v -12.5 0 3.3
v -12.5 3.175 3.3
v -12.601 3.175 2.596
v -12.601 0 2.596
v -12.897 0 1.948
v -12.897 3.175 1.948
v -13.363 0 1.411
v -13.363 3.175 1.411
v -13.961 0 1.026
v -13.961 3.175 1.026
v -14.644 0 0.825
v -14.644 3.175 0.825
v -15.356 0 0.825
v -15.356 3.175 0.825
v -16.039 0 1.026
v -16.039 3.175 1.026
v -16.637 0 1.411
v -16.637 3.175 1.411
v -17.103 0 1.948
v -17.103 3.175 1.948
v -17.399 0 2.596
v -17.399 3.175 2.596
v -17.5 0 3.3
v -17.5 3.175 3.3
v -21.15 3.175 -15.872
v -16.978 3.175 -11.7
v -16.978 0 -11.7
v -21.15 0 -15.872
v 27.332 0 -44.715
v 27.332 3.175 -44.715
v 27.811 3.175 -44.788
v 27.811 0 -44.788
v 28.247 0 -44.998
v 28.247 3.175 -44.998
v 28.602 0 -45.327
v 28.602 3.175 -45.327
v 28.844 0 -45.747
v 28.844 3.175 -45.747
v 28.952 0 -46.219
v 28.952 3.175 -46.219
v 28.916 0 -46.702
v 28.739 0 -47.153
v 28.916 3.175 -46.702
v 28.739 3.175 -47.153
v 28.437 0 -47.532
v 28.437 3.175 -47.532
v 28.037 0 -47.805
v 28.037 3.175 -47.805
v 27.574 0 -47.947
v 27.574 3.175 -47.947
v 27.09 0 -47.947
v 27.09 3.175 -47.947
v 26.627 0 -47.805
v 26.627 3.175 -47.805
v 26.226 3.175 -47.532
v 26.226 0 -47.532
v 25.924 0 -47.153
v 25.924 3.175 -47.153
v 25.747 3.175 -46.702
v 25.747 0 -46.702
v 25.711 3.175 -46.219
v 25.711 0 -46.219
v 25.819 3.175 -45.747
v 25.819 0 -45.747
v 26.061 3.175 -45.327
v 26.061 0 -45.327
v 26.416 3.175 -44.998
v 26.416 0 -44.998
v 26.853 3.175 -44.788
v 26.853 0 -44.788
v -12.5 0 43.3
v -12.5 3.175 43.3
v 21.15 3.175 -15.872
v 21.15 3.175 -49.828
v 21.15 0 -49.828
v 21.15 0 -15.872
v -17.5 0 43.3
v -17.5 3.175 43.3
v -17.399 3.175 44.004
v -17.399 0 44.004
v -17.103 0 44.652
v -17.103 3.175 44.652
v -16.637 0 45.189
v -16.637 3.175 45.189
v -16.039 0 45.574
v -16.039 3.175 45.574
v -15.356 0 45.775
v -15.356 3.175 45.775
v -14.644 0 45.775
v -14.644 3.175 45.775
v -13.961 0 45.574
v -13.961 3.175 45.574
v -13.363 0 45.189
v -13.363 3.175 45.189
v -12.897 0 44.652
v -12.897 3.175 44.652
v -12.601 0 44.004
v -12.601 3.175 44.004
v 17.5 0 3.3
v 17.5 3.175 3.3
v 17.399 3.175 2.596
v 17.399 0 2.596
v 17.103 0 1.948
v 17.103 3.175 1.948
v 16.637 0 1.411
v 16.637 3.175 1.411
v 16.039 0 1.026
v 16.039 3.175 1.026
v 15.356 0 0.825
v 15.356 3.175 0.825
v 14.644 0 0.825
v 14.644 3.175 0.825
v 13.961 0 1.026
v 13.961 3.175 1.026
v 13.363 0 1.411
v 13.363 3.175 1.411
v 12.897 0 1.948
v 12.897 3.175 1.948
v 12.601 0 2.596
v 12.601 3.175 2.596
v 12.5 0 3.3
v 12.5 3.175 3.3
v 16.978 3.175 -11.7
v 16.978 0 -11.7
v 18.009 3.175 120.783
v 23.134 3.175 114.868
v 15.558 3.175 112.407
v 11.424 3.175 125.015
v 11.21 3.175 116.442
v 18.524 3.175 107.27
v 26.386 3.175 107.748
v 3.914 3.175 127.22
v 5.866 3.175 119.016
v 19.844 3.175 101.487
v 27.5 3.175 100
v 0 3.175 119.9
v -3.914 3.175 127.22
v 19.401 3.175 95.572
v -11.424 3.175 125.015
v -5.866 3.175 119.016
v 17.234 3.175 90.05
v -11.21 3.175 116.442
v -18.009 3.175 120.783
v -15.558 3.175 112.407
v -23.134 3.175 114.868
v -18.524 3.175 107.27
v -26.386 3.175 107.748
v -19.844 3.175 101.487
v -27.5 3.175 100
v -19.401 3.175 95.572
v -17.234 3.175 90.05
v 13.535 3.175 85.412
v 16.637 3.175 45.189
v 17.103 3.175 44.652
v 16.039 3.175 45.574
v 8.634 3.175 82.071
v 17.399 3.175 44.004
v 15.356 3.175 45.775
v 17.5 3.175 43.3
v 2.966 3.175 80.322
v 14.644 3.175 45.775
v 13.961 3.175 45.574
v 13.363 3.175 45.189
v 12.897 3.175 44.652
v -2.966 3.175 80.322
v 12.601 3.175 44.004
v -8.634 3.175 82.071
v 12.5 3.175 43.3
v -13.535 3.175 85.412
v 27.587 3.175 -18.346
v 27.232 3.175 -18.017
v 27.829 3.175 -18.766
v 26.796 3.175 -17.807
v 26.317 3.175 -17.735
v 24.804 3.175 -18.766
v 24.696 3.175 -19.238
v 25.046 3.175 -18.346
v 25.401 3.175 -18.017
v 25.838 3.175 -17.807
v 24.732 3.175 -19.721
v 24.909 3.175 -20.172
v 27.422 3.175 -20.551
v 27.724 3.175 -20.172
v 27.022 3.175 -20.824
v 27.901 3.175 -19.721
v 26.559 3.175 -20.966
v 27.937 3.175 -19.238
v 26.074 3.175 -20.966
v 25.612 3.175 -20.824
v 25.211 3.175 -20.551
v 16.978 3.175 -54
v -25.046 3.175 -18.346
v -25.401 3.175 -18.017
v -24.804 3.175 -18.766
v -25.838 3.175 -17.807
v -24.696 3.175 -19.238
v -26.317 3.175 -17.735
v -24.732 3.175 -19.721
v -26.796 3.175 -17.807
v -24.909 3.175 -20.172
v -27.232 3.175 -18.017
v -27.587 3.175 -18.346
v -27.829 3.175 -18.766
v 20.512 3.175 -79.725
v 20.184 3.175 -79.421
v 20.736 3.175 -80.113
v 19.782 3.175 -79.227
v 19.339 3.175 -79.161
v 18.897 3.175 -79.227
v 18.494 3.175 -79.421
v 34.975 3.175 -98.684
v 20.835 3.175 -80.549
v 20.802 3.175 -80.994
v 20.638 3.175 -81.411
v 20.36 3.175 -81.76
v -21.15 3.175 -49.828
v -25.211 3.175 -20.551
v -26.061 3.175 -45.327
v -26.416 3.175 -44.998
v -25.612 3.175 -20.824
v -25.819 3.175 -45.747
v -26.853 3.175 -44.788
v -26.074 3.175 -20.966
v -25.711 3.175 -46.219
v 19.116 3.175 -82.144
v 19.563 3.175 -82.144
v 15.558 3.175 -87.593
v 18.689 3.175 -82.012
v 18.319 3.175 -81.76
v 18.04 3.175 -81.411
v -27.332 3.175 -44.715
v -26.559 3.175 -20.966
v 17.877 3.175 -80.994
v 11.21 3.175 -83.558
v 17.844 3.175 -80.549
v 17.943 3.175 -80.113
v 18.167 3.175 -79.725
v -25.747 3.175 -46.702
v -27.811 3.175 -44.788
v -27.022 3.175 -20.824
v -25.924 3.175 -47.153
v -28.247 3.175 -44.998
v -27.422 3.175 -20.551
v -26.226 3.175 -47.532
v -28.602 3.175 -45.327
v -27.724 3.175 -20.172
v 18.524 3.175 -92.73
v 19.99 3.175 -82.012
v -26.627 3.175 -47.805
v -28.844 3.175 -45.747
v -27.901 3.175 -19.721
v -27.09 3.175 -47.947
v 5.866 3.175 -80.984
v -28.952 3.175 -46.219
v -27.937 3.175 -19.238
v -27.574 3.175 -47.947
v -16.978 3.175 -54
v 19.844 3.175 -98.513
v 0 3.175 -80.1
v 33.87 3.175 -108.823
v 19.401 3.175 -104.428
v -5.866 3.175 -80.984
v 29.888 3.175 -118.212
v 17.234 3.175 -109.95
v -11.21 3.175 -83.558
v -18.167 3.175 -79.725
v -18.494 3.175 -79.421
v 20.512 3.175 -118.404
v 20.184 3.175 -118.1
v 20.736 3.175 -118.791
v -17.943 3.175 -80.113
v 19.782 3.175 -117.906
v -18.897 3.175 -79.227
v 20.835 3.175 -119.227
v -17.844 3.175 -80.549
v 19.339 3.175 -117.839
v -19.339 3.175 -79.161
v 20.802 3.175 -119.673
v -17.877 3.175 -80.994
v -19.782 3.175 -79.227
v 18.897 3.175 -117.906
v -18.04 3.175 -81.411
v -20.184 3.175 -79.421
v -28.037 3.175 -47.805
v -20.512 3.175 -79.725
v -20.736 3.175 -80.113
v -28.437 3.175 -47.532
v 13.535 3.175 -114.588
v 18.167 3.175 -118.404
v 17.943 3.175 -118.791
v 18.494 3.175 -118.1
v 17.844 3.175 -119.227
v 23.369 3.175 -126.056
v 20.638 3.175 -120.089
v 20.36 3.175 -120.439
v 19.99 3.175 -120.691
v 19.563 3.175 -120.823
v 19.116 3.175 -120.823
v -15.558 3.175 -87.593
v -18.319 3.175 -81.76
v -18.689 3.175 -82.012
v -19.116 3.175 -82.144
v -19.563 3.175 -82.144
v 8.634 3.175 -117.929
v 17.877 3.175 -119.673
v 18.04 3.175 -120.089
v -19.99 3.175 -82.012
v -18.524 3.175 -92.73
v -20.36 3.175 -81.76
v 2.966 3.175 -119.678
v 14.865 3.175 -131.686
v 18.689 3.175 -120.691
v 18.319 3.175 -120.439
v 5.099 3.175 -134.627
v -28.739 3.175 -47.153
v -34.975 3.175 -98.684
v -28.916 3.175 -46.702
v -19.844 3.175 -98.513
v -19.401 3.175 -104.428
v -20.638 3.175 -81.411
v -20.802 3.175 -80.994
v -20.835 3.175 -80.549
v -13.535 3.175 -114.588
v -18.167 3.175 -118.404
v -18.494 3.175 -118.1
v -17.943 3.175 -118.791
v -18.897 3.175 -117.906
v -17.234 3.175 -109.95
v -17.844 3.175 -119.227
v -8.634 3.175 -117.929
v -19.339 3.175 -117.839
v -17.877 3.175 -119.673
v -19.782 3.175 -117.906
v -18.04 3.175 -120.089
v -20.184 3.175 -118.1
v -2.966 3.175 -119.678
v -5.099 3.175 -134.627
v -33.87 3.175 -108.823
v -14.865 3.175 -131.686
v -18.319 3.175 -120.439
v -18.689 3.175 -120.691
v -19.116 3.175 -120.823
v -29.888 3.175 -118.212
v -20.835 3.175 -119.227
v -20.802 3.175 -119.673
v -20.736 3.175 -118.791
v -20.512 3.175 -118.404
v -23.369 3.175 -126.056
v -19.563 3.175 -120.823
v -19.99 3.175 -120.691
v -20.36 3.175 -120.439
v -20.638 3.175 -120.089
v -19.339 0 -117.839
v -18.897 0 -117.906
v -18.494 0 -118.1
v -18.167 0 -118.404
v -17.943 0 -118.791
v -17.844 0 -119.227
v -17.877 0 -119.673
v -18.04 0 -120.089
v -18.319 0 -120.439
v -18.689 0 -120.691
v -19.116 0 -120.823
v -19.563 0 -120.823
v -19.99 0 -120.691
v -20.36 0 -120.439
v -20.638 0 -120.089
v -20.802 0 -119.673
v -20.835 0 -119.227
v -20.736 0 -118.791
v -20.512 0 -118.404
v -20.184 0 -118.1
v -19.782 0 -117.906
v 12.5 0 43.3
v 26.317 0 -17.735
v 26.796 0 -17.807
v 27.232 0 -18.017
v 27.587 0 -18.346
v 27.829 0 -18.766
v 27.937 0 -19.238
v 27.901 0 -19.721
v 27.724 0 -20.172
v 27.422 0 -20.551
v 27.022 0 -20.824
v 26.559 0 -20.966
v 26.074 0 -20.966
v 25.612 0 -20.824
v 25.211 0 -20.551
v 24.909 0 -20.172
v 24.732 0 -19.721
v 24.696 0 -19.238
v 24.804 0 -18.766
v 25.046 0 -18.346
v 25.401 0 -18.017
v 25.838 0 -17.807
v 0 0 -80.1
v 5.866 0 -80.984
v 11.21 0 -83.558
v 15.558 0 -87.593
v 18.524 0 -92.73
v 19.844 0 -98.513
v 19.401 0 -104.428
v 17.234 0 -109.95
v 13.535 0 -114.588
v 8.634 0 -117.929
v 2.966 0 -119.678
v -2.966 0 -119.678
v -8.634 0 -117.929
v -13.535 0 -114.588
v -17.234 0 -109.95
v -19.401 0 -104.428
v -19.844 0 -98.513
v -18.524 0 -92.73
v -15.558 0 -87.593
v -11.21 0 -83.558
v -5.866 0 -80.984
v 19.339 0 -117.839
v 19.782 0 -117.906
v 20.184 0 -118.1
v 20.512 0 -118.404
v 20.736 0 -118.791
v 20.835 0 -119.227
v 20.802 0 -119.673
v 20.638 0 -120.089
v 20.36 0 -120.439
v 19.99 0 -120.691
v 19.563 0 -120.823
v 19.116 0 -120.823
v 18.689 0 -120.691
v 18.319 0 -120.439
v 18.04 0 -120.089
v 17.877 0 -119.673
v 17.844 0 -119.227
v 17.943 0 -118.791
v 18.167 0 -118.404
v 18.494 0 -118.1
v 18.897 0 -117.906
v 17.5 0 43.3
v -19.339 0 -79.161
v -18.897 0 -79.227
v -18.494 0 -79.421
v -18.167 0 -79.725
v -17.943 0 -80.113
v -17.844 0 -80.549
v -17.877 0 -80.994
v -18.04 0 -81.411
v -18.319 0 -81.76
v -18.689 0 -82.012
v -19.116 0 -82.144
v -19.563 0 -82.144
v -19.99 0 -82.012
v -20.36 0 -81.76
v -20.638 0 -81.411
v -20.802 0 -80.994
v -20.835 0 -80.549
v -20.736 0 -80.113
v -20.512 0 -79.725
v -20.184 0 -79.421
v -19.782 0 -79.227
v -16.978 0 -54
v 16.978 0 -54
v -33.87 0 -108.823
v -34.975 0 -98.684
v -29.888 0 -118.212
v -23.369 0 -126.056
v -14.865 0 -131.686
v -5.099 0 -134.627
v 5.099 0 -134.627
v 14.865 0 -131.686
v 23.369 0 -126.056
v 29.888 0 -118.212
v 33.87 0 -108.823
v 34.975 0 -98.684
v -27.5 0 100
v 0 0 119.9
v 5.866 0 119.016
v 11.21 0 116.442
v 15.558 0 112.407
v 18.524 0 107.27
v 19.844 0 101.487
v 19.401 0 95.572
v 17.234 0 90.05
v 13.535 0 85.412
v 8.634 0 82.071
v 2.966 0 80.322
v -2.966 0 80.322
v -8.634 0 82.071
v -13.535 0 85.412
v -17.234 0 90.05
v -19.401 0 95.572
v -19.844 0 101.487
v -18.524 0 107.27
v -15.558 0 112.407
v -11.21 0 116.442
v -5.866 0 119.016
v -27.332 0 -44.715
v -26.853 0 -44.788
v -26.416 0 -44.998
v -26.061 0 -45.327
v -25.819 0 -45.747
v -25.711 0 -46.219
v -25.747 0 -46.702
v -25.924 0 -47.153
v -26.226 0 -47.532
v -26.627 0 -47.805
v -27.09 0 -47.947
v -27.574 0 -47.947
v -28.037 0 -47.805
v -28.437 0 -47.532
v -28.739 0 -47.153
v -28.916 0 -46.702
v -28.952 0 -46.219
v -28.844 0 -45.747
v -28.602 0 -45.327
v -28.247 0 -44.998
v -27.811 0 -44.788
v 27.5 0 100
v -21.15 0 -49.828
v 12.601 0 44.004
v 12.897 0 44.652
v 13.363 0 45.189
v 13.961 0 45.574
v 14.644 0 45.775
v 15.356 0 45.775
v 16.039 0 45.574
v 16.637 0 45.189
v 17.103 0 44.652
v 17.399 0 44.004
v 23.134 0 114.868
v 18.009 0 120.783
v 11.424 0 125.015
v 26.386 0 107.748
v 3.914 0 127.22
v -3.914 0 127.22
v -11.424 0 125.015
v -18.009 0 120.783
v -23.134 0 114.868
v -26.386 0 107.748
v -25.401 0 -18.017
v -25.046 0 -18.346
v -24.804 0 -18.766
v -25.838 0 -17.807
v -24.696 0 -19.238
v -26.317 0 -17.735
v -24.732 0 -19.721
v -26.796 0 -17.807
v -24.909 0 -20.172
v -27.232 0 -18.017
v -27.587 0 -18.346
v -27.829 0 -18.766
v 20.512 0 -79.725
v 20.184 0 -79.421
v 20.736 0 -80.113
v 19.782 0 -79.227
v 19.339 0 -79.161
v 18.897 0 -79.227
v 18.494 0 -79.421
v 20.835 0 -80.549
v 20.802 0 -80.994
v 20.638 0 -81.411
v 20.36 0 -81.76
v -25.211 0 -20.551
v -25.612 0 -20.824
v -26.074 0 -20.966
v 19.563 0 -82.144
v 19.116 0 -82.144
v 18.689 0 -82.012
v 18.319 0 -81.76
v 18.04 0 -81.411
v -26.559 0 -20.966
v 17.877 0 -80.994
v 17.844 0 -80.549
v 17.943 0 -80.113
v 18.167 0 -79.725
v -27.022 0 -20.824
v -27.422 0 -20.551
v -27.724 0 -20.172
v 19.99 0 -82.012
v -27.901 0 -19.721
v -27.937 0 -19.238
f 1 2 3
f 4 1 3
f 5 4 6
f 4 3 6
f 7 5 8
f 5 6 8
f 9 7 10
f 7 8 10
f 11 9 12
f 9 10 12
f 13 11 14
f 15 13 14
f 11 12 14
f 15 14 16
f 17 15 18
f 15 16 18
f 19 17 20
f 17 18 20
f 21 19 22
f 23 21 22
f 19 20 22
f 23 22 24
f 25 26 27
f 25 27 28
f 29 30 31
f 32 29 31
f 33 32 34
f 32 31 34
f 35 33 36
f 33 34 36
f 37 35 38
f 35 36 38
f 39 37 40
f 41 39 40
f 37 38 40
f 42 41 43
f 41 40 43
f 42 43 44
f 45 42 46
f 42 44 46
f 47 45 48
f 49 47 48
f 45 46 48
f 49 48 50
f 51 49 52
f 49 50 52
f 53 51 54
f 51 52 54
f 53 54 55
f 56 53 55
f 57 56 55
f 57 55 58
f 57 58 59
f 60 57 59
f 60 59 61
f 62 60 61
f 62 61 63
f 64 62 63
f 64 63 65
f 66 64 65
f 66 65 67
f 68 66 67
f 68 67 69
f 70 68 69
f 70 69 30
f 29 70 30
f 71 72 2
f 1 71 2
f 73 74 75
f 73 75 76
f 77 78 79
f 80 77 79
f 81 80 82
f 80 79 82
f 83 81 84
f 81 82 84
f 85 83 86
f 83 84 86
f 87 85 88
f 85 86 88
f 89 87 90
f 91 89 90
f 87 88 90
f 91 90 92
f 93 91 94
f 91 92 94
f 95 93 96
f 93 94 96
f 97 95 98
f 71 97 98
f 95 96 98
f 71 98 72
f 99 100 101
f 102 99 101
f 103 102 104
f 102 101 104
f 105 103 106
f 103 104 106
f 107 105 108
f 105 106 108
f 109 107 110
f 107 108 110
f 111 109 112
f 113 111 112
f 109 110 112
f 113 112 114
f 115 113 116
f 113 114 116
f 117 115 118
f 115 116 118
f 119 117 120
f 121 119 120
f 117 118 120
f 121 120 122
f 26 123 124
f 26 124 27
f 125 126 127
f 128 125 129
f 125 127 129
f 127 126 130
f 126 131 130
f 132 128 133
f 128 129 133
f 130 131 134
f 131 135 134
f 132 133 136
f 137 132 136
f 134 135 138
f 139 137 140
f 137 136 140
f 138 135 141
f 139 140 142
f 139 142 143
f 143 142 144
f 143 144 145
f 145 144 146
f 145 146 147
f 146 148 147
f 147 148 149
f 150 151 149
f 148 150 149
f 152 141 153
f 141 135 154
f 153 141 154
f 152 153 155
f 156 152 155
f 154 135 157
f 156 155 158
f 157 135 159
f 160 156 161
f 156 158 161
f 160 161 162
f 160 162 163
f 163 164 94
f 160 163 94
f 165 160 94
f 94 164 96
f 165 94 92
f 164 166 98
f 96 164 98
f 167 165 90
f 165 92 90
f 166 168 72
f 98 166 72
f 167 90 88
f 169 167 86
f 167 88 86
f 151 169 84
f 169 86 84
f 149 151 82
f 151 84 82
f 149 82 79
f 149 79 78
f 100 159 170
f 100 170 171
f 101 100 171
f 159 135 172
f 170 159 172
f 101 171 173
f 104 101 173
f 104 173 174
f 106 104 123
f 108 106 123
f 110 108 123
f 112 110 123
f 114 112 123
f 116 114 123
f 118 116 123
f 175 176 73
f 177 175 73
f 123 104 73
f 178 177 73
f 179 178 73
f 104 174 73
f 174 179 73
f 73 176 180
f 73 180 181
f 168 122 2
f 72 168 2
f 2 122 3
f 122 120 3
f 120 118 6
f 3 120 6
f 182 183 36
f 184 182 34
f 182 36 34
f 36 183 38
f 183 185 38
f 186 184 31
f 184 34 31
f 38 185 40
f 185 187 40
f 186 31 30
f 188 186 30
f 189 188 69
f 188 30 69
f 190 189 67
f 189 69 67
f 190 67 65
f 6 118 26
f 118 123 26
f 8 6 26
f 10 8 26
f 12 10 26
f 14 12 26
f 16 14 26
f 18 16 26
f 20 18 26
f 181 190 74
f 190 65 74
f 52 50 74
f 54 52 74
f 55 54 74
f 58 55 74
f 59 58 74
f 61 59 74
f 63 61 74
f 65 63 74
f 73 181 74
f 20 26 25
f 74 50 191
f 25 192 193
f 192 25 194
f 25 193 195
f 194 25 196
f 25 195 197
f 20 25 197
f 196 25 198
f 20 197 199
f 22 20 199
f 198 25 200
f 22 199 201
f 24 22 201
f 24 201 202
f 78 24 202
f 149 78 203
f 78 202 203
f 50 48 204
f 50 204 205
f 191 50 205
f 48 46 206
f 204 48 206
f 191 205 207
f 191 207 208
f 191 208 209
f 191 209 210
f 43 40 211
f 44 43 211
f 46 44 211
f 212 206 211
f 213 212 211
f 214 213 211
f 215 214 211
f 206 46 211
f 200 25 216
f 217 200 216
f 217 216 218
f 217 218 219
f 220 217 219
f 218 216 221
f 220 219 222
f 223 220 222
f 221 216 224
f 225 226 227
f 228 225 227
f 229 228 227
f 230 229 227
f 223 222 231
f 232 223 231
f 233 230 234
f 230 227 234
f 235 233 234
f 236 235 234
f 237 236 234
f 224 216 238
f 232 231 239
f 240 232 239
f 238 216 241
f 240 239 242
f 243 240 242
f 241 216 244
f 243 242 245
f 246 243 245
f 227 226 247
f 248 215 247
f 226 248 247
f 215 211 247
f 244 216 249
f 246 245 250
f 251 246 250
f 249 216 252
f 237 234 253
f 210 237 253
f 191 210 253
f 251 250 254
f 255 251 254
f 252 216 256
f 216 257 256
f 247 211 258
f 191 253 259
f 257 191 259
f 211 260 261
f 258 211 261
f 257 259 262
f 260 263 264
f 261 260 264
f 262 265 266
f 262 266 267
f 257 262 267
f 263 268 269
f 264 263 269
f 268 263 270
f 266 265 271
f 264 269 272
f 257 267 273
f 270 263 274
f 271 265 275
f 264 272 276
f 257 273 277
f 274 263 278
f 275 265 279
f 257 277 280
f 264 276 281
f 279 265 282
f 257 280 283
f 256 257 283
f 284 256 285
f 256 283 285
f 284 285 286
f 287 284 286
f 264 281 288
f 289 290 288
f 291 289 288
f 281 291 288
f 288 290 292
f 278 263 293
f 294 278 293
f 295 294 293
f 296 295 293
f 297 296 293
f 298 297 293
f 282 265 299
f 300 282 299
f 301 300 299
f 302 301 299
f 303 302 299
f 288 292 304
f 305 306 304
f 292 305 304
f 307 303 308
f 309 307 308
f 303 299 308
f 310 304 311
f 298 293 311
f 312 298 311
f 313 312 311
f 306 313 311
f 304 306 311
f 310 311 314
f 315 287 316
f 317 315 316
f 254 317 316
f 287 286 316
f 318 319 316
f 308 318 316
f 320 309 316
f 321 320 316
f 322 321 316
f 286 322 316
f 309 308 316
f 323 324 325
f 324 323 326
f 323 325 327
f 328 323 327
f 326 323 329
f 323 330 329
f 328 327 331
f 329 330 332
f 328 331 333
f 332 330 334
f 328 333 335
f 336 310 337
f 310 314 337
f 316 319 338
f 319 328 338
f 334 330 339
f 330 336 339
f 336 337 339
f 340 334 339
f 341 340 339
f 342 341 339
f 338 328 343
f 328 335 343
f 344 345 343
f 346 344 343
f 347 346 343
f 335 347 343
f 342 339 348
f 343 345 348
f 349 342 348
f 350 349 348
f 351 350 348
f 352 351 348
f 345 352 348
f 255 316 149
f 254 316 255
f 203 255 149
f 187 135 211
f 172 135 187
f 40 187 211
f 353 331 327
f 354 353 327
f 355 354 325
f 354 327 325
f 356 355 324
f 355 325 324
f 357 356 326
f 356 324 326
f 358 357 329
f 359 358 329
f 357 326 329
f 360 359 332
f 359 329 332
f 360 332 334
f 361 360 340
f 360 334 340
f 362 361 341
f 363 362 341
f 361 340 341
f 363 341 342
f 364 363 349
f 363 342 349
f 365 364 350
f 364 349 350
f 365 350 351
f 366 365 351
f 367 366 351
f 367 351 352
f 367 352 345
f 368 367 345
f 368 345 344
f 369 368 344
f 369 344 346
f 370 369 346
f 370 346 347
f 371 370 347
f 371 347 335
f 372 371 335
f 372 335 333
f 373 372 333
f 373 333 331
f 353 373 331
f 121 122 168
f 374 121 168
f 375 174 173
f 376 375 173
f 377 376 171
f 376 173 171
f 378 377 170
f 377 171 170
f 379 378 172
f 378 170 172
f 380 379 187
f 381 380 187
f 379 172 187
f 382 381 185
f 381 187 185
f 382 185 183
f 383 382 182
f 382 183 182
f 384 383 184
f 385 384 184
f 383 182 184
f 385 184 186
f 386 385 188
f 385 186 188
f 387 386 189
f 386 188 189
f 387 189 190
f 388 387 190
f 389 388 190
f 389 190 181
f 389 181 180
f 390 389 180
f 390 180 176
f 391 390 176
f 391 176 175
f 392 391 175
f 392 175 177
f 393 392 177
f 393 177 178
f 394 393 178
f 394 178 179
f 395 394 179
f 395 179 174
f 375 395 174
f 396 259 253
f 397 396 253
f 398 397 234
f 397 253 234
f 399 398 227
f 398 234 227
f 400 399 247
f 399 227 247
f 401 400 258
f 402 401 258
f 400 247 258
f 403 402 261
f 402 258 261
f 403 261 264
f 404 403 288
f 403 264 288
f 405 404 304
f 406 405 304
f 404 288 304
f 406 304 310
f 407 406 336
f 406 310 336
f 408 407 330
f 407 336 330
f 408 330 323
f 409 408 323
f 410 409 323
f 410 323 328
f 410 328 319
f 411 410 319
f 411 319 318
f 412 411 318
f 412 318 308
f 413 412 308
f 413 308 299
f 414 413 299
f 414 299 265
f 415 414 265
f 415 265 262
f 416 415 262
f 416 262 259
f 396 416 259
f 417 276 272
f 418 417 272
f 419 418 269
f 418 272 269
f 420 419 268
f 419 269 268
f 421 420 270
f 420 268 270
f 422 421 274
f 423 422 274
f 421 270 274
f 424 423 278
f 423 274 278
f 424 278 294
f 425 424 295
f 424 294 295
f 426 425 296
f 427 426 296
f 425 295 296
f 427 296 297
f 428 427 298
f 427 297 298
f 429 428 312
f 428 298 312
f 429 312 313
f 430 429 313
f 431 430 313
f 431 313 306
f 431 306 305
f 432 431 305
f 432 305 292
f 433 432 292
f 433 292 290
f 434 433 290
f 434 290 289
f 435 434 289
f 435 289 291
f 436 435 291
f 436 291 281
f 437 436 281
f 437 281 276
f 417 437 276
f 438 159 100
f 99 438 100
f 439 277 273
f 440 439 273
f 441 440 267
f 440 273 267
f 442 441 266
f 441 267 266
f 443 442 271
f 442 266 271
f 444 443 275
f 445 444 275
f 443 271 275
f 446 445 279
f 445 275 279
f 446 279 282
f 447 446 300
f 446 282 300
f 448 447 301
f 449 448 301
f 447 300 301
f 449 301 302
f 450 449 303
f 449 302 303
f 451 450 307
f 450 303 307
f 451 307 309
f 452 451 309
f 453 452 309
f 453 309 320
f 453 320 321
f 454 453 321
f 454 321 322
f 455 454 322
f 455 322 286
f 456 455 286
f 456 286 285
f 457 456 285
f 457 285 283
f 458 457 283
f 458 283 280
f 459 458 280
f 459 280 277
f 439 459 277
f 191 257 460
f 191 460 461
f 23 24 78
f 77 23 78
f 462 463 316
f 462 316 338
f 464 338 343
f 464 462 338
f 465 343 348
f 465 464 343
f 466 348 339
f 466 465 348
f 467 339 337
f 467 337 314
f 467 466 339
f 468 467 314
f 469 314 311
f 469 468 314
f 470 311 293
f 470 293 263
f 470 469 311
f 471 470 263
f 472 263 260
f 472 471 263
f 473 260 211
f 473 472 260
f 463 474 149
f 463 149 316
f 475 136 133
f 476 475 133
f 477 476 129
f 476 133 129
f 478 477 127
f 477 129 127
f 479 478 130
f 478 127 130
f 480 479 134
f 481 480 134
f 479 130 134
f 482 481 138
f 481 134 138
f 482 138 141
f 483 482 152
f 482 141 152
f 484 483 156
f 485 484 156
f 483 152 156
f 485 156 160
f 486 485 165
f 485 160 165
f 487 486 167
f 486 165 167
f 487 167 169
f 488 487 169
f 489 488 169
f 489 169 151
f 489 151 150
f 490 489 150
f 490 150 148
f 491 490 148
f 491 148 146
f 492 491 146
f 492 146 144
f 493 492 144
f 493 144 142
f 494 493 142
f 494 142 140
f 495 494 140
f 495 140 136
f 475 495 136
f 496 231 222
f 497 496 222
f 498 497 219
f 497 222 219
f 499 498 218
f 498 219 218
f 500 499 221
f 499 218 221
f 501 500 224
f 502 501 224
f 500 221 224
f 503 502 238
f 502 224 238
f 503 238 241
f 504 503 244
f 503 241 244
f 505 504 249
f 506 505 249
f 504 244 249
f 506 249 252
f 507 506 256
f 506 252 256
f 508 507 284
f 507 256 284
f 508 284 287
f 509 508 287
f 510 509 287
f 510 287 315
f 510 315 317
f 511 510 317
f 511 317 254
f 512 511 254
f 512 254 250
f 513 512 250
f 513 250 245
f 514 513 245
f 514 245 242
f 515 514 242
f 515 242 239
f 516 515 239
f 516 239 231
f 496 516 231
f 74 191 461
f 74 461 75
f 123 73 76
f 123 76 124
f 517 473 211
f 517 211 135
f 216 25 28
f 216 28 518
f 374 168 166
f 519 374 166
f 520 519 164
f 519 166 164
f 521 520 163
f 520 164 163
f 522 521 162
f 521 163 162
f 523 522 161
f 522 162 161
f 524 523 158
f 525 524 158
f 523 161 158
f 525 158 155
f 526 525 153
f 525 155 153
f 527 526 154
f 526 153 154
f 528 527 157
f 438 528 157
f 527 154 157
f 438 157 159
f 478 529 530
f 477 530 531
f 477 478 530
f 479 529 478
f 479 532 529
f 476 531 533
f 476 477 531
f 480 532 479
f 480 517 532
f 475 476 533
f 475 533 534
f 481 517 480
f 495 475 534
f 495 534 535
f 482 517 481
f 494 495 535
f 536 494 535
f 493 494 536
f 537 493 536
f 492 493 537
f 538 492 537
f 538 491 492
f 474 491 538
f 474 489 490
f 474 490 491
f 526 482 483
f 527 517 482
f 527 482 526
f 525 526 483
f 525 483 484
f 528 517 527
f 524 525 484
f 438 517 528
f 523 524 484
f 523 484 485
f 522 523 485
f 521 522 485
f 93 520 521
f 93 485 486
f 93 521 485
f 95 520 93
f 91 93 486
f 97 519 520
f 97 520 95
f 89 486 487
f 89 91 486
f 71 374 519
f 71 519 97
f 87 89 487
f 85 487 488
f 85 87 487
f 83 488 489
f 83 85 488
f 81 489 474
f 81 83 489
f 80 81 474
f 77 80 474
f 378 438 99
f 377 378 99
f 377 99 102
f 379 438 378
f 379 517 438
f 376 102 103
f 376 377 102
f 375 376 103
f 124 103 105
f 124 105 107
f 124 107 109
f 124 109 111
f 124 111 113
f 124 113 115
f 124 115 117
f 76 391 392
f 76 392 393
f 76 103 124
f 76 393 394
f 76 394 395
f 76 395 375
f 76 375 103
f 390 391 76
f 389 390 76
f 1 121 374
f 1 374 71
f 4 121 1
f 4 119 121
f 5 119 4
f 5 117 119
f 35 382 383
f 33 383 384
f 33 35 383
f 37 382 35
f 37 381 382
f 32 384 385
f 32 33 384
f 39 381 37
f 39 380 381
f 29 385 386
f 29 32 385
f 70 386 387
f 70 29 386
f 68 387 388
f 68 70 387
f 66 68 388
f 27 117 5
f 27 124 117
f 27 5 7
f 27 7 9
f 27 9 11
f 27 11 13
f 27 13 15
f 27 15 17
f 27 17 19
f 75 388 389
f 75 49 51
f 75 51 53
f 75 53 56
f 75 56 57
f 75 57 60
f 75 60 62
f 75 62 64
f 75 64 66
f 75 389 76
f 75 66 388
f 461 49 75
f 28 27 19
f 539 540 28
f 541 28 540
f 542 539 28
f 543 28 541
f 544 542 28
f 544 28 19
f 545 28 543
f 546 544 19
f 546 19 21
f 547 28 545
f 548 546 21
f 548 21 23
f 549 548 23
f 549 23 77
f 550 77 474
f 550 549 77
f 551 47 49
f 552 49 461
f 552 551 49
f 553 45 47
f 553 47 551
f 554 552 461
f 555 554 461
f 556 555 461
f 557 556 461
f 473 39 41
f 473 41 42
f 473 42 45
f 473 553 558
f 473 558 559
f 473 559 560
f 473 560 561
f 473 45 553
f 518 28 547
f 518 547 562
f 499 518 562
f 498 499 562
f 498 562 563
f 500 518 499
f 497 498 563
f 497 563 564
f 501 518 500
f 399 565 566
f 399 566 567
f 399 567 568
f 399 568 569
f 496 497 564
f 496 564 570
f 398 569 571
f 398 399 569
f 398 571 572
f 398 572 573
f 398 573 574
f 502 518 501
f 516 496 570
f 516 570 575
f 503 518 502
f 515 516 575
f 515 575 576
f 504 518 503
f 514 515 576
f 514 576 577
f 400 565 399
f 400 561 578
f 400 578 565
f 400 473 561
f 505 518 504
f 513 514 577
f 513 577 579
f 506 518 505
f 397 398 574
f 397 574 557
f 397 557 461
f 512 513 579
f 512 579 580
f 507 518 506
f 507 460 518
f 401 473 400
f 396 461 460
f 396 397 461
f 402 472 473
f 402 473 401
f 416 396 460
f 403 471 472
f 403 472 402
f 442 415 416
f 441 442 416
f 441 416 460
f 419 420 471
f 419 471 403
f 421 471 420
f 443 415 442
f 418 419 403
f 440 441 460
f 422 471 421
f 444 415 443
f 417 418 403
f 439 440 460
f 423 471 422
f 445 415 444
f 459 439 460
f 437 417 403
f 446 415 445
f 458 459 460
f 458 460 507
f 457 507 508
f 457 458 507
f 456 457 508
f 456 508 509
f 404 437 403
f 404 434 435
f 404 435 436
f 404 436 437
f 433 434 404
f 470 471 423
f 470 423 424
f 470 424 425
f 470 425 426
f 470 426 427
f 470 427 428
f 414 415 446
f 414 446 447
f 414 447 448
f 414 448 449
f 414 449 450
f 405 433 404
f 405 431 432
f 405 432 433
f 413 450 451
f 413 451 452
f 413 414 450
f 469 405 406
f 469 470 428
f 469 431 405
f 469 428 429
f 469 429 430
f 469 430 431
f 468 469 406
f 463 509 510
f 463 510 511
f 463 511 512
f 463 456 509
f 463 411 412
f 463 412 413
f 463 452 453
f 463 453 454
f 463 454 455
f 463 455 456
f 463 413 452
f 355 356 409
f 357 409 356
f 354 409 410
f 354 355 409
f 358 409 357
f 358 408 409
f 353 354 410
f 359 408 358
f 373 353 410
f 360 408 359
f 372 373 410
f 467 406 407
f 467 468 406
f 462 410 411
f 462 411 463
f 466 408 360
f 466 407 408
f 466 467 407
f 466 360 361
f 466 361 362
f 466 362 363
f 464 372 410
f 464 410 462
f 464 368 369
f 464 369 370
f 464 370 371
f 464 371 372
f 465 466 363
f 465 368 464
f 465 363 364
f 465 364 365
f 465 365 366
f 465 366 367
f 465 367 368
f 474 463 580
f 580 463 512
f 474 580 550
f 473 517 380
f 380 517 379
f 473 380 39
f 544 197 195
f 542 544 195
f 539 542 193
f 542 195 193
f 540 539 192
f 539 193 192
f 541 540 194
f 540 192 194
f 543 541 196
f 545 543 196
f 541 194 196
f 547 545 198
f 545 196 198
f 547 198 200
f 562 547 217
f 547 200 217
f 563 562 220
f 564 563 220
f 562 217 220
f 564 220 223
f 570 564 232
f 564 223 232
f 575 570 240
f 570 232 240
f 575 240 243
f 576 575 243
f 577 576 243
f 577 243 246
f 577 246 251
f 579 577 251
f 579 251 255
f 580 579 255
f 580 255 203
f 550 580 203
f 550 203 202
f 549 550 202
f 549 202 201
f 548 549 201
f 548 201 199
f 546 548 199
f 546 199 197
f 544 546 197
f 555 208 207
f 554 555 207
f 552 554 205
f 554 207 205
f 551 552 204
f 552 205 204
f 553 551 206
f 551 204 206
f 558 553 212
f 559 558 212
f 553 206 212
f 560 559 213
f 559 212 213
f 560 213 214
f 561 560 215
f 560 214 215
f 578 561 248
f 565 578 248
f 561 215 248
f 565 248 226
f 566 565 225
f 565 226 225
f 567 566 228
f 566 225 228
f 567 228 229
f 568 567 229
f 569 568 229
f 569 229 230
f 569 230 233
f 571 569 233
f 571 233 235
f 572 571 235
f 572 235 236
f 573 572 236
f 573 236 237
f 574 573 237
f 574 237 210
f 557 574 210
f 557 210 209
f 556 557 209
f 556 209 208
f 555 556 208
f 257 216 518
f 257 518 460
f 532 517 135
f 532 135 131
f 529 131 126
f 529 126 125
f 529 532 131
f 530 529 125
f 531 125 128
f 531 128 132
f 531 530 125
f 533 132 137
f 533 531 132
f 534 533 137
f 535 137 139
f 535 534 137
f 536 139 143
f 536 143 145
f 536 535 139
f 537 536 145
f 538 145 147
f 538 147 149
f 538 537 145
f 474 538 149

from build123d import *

# Parameters (mm, degrees)
BOSS_EXTRUDE1_DEPTH     = 3.175
SKETCH2_R               = 19.9
CUT_EXTRUDE1_DEPTH      = 140.49939292
ESQUISSE2_R             = 1.5
ENL_V_MAT_EXTRU_1_DEPTH = 140.49939292
SKETCH5_R               = 1.625
CUT_EXTRUDE3_DEPTH      = 140.49939292
CUT_EXTRUDE4_DEPTH      = 140.49939292


with BuildPart() as part:
    # Sketch1 → Boss-Extrude1 (new body)
    with BuildSketch(Plane(origin=(0, 0, 0), x_dir=(1, 0, 0), z_dir=(0, 1, 0))):
        with BuildLine():
            Line((-27.5, -100), (-34.975254116, 98.684097441))
            ThreePointArc((-34.975254116, 98.684097441), (0, 135), (34.975254116, 98.684097441))
            Line((34.975254116, 98.684097441), (27.5, -100))
            ThreePointArc((27.5, -100), (0, -127.5), (-27.5, -100))
        make_face()
    extrude(amount=BOSS_EXTRUDE1_DEPTH)

    # Sketch2 → Cut-Extrude1 (cut, through all)
    with BuildSketch(Plane(origin=(0, 3.175, 0), x_dir=(1, 0, 0), z_dir=(0, 1, 0))):
        with Locations(Location((0, -100, 0), (0, 0, 270))):
            Circle(SKETCH2_R)
        with Locations(Location((0, 100, 0), (0, 0, 270))):
            Circle(SKETCH2_R)
    extrude(amount=-CUT_EXTRUDE1_DEPTH, mode=Mode.SUBTRACT)

    # Esquisse2 → Enlèv. mat.-Extru.1 (cut, through all)
    with BuildSketch(Plane(origin=(0, 3.175, 0), x_dir=(1, 0, 0), z_dir=(0, 1, 0))):
        with Locations(Location((19.339370465, 80.660629535, 0), (0, 0, 270))):
            Circle(ESQUISSE2_R)
        with Locations(Location((19.339370465, 119.339370465, 0), (0, 0, 270))):
            Circle(ESQUISSE2_R)
        with Locations(Location((-19.339370465, 119.339370465, 0), (0, 0, 270))):
            Circle(ESQUISSE2_R)
        with Locations(Location((-19.339370465, 80.660629535, 0), (0, 0, 270))):
            Circle(ESQUISSE2_R)
    extrude(amount=-ENL_V_MAT_EXTRU_1_DEPTH, mode=Mode.SUBTRACT)

    # Sketch5 → Cut-Extrude3 (cut, through all)
    with BuildSketch(Plane(origin=(0, 3.175, 0), x_dir=(1, 0, 0), z_dir=(0, 1, 0))):
        with Locations(Location((-27.331724457, 46.340455159, 0), (0, 0, 270))):
            Circle(SKETCH5_R)
        with Locations(Location((-26.316599626, 19.359544841, 0), (0, 0, 270))):
            Circle(SKETCH5_R)
        with Locations(Location((26.316599626, 19.359544841, 0), (0, 0, 270))):
            Circle(SKETCH5_R)
        with Locations(Location((27.331724457, 46.340455159, 0), (0, 0, 270))):
            Circle(SKETCH5_R)
        Polygon((-21.15, 49.828069991), (-16.978069991, 54), (16.978069991, 54), (21.15, 49.828069991), (21.15, 15.871930009), (16.978069991, 11.7), (-16.978069991, 11.7), (-21.15, 15.871930009), align=None)
    extrude(amount=-CUT_EXTRUDE3_DEPTH, mode=Mode.SUBTRACT)

    # Sketch7 → Cut-Extrude4 (cut, through all)
    with BuildSketch(Plane(origin=(0, 3.175, 0), x_dir=(1, 0, 0), z_dir=(0, 1, 0))):
        with BuildLine():
            Line((17.5, -43.3), (17.5, -3.3))
            ThreePointArc((17.5, -3.3), (15, -0.8), (12.5, -3.3))
            Line((12.5, -3.3), (12.5, -43.3))
            ThreePointArc((12.5, -43.3), (15, -45.8), (17.5, -43.3))
        make_face()
        with BuildLine():
            Line((-12.5, -43.3), (-12.5, -3.3))
            ThreePointArc((-12.5, -3.3), (-15, -0.8), (-17.5, -3.3))
            Line((-17.5, -3.3), (-17.5, -43.3))
            ThreePointArc((-17.5, -43.3), (-15, -45.8), (-12.5, -43.3))
        make_face()
    extrude(amount=-CUT_EXTRUDE4_DEPTH, mode=Mode.SUBTRACT)


solid = part.part
